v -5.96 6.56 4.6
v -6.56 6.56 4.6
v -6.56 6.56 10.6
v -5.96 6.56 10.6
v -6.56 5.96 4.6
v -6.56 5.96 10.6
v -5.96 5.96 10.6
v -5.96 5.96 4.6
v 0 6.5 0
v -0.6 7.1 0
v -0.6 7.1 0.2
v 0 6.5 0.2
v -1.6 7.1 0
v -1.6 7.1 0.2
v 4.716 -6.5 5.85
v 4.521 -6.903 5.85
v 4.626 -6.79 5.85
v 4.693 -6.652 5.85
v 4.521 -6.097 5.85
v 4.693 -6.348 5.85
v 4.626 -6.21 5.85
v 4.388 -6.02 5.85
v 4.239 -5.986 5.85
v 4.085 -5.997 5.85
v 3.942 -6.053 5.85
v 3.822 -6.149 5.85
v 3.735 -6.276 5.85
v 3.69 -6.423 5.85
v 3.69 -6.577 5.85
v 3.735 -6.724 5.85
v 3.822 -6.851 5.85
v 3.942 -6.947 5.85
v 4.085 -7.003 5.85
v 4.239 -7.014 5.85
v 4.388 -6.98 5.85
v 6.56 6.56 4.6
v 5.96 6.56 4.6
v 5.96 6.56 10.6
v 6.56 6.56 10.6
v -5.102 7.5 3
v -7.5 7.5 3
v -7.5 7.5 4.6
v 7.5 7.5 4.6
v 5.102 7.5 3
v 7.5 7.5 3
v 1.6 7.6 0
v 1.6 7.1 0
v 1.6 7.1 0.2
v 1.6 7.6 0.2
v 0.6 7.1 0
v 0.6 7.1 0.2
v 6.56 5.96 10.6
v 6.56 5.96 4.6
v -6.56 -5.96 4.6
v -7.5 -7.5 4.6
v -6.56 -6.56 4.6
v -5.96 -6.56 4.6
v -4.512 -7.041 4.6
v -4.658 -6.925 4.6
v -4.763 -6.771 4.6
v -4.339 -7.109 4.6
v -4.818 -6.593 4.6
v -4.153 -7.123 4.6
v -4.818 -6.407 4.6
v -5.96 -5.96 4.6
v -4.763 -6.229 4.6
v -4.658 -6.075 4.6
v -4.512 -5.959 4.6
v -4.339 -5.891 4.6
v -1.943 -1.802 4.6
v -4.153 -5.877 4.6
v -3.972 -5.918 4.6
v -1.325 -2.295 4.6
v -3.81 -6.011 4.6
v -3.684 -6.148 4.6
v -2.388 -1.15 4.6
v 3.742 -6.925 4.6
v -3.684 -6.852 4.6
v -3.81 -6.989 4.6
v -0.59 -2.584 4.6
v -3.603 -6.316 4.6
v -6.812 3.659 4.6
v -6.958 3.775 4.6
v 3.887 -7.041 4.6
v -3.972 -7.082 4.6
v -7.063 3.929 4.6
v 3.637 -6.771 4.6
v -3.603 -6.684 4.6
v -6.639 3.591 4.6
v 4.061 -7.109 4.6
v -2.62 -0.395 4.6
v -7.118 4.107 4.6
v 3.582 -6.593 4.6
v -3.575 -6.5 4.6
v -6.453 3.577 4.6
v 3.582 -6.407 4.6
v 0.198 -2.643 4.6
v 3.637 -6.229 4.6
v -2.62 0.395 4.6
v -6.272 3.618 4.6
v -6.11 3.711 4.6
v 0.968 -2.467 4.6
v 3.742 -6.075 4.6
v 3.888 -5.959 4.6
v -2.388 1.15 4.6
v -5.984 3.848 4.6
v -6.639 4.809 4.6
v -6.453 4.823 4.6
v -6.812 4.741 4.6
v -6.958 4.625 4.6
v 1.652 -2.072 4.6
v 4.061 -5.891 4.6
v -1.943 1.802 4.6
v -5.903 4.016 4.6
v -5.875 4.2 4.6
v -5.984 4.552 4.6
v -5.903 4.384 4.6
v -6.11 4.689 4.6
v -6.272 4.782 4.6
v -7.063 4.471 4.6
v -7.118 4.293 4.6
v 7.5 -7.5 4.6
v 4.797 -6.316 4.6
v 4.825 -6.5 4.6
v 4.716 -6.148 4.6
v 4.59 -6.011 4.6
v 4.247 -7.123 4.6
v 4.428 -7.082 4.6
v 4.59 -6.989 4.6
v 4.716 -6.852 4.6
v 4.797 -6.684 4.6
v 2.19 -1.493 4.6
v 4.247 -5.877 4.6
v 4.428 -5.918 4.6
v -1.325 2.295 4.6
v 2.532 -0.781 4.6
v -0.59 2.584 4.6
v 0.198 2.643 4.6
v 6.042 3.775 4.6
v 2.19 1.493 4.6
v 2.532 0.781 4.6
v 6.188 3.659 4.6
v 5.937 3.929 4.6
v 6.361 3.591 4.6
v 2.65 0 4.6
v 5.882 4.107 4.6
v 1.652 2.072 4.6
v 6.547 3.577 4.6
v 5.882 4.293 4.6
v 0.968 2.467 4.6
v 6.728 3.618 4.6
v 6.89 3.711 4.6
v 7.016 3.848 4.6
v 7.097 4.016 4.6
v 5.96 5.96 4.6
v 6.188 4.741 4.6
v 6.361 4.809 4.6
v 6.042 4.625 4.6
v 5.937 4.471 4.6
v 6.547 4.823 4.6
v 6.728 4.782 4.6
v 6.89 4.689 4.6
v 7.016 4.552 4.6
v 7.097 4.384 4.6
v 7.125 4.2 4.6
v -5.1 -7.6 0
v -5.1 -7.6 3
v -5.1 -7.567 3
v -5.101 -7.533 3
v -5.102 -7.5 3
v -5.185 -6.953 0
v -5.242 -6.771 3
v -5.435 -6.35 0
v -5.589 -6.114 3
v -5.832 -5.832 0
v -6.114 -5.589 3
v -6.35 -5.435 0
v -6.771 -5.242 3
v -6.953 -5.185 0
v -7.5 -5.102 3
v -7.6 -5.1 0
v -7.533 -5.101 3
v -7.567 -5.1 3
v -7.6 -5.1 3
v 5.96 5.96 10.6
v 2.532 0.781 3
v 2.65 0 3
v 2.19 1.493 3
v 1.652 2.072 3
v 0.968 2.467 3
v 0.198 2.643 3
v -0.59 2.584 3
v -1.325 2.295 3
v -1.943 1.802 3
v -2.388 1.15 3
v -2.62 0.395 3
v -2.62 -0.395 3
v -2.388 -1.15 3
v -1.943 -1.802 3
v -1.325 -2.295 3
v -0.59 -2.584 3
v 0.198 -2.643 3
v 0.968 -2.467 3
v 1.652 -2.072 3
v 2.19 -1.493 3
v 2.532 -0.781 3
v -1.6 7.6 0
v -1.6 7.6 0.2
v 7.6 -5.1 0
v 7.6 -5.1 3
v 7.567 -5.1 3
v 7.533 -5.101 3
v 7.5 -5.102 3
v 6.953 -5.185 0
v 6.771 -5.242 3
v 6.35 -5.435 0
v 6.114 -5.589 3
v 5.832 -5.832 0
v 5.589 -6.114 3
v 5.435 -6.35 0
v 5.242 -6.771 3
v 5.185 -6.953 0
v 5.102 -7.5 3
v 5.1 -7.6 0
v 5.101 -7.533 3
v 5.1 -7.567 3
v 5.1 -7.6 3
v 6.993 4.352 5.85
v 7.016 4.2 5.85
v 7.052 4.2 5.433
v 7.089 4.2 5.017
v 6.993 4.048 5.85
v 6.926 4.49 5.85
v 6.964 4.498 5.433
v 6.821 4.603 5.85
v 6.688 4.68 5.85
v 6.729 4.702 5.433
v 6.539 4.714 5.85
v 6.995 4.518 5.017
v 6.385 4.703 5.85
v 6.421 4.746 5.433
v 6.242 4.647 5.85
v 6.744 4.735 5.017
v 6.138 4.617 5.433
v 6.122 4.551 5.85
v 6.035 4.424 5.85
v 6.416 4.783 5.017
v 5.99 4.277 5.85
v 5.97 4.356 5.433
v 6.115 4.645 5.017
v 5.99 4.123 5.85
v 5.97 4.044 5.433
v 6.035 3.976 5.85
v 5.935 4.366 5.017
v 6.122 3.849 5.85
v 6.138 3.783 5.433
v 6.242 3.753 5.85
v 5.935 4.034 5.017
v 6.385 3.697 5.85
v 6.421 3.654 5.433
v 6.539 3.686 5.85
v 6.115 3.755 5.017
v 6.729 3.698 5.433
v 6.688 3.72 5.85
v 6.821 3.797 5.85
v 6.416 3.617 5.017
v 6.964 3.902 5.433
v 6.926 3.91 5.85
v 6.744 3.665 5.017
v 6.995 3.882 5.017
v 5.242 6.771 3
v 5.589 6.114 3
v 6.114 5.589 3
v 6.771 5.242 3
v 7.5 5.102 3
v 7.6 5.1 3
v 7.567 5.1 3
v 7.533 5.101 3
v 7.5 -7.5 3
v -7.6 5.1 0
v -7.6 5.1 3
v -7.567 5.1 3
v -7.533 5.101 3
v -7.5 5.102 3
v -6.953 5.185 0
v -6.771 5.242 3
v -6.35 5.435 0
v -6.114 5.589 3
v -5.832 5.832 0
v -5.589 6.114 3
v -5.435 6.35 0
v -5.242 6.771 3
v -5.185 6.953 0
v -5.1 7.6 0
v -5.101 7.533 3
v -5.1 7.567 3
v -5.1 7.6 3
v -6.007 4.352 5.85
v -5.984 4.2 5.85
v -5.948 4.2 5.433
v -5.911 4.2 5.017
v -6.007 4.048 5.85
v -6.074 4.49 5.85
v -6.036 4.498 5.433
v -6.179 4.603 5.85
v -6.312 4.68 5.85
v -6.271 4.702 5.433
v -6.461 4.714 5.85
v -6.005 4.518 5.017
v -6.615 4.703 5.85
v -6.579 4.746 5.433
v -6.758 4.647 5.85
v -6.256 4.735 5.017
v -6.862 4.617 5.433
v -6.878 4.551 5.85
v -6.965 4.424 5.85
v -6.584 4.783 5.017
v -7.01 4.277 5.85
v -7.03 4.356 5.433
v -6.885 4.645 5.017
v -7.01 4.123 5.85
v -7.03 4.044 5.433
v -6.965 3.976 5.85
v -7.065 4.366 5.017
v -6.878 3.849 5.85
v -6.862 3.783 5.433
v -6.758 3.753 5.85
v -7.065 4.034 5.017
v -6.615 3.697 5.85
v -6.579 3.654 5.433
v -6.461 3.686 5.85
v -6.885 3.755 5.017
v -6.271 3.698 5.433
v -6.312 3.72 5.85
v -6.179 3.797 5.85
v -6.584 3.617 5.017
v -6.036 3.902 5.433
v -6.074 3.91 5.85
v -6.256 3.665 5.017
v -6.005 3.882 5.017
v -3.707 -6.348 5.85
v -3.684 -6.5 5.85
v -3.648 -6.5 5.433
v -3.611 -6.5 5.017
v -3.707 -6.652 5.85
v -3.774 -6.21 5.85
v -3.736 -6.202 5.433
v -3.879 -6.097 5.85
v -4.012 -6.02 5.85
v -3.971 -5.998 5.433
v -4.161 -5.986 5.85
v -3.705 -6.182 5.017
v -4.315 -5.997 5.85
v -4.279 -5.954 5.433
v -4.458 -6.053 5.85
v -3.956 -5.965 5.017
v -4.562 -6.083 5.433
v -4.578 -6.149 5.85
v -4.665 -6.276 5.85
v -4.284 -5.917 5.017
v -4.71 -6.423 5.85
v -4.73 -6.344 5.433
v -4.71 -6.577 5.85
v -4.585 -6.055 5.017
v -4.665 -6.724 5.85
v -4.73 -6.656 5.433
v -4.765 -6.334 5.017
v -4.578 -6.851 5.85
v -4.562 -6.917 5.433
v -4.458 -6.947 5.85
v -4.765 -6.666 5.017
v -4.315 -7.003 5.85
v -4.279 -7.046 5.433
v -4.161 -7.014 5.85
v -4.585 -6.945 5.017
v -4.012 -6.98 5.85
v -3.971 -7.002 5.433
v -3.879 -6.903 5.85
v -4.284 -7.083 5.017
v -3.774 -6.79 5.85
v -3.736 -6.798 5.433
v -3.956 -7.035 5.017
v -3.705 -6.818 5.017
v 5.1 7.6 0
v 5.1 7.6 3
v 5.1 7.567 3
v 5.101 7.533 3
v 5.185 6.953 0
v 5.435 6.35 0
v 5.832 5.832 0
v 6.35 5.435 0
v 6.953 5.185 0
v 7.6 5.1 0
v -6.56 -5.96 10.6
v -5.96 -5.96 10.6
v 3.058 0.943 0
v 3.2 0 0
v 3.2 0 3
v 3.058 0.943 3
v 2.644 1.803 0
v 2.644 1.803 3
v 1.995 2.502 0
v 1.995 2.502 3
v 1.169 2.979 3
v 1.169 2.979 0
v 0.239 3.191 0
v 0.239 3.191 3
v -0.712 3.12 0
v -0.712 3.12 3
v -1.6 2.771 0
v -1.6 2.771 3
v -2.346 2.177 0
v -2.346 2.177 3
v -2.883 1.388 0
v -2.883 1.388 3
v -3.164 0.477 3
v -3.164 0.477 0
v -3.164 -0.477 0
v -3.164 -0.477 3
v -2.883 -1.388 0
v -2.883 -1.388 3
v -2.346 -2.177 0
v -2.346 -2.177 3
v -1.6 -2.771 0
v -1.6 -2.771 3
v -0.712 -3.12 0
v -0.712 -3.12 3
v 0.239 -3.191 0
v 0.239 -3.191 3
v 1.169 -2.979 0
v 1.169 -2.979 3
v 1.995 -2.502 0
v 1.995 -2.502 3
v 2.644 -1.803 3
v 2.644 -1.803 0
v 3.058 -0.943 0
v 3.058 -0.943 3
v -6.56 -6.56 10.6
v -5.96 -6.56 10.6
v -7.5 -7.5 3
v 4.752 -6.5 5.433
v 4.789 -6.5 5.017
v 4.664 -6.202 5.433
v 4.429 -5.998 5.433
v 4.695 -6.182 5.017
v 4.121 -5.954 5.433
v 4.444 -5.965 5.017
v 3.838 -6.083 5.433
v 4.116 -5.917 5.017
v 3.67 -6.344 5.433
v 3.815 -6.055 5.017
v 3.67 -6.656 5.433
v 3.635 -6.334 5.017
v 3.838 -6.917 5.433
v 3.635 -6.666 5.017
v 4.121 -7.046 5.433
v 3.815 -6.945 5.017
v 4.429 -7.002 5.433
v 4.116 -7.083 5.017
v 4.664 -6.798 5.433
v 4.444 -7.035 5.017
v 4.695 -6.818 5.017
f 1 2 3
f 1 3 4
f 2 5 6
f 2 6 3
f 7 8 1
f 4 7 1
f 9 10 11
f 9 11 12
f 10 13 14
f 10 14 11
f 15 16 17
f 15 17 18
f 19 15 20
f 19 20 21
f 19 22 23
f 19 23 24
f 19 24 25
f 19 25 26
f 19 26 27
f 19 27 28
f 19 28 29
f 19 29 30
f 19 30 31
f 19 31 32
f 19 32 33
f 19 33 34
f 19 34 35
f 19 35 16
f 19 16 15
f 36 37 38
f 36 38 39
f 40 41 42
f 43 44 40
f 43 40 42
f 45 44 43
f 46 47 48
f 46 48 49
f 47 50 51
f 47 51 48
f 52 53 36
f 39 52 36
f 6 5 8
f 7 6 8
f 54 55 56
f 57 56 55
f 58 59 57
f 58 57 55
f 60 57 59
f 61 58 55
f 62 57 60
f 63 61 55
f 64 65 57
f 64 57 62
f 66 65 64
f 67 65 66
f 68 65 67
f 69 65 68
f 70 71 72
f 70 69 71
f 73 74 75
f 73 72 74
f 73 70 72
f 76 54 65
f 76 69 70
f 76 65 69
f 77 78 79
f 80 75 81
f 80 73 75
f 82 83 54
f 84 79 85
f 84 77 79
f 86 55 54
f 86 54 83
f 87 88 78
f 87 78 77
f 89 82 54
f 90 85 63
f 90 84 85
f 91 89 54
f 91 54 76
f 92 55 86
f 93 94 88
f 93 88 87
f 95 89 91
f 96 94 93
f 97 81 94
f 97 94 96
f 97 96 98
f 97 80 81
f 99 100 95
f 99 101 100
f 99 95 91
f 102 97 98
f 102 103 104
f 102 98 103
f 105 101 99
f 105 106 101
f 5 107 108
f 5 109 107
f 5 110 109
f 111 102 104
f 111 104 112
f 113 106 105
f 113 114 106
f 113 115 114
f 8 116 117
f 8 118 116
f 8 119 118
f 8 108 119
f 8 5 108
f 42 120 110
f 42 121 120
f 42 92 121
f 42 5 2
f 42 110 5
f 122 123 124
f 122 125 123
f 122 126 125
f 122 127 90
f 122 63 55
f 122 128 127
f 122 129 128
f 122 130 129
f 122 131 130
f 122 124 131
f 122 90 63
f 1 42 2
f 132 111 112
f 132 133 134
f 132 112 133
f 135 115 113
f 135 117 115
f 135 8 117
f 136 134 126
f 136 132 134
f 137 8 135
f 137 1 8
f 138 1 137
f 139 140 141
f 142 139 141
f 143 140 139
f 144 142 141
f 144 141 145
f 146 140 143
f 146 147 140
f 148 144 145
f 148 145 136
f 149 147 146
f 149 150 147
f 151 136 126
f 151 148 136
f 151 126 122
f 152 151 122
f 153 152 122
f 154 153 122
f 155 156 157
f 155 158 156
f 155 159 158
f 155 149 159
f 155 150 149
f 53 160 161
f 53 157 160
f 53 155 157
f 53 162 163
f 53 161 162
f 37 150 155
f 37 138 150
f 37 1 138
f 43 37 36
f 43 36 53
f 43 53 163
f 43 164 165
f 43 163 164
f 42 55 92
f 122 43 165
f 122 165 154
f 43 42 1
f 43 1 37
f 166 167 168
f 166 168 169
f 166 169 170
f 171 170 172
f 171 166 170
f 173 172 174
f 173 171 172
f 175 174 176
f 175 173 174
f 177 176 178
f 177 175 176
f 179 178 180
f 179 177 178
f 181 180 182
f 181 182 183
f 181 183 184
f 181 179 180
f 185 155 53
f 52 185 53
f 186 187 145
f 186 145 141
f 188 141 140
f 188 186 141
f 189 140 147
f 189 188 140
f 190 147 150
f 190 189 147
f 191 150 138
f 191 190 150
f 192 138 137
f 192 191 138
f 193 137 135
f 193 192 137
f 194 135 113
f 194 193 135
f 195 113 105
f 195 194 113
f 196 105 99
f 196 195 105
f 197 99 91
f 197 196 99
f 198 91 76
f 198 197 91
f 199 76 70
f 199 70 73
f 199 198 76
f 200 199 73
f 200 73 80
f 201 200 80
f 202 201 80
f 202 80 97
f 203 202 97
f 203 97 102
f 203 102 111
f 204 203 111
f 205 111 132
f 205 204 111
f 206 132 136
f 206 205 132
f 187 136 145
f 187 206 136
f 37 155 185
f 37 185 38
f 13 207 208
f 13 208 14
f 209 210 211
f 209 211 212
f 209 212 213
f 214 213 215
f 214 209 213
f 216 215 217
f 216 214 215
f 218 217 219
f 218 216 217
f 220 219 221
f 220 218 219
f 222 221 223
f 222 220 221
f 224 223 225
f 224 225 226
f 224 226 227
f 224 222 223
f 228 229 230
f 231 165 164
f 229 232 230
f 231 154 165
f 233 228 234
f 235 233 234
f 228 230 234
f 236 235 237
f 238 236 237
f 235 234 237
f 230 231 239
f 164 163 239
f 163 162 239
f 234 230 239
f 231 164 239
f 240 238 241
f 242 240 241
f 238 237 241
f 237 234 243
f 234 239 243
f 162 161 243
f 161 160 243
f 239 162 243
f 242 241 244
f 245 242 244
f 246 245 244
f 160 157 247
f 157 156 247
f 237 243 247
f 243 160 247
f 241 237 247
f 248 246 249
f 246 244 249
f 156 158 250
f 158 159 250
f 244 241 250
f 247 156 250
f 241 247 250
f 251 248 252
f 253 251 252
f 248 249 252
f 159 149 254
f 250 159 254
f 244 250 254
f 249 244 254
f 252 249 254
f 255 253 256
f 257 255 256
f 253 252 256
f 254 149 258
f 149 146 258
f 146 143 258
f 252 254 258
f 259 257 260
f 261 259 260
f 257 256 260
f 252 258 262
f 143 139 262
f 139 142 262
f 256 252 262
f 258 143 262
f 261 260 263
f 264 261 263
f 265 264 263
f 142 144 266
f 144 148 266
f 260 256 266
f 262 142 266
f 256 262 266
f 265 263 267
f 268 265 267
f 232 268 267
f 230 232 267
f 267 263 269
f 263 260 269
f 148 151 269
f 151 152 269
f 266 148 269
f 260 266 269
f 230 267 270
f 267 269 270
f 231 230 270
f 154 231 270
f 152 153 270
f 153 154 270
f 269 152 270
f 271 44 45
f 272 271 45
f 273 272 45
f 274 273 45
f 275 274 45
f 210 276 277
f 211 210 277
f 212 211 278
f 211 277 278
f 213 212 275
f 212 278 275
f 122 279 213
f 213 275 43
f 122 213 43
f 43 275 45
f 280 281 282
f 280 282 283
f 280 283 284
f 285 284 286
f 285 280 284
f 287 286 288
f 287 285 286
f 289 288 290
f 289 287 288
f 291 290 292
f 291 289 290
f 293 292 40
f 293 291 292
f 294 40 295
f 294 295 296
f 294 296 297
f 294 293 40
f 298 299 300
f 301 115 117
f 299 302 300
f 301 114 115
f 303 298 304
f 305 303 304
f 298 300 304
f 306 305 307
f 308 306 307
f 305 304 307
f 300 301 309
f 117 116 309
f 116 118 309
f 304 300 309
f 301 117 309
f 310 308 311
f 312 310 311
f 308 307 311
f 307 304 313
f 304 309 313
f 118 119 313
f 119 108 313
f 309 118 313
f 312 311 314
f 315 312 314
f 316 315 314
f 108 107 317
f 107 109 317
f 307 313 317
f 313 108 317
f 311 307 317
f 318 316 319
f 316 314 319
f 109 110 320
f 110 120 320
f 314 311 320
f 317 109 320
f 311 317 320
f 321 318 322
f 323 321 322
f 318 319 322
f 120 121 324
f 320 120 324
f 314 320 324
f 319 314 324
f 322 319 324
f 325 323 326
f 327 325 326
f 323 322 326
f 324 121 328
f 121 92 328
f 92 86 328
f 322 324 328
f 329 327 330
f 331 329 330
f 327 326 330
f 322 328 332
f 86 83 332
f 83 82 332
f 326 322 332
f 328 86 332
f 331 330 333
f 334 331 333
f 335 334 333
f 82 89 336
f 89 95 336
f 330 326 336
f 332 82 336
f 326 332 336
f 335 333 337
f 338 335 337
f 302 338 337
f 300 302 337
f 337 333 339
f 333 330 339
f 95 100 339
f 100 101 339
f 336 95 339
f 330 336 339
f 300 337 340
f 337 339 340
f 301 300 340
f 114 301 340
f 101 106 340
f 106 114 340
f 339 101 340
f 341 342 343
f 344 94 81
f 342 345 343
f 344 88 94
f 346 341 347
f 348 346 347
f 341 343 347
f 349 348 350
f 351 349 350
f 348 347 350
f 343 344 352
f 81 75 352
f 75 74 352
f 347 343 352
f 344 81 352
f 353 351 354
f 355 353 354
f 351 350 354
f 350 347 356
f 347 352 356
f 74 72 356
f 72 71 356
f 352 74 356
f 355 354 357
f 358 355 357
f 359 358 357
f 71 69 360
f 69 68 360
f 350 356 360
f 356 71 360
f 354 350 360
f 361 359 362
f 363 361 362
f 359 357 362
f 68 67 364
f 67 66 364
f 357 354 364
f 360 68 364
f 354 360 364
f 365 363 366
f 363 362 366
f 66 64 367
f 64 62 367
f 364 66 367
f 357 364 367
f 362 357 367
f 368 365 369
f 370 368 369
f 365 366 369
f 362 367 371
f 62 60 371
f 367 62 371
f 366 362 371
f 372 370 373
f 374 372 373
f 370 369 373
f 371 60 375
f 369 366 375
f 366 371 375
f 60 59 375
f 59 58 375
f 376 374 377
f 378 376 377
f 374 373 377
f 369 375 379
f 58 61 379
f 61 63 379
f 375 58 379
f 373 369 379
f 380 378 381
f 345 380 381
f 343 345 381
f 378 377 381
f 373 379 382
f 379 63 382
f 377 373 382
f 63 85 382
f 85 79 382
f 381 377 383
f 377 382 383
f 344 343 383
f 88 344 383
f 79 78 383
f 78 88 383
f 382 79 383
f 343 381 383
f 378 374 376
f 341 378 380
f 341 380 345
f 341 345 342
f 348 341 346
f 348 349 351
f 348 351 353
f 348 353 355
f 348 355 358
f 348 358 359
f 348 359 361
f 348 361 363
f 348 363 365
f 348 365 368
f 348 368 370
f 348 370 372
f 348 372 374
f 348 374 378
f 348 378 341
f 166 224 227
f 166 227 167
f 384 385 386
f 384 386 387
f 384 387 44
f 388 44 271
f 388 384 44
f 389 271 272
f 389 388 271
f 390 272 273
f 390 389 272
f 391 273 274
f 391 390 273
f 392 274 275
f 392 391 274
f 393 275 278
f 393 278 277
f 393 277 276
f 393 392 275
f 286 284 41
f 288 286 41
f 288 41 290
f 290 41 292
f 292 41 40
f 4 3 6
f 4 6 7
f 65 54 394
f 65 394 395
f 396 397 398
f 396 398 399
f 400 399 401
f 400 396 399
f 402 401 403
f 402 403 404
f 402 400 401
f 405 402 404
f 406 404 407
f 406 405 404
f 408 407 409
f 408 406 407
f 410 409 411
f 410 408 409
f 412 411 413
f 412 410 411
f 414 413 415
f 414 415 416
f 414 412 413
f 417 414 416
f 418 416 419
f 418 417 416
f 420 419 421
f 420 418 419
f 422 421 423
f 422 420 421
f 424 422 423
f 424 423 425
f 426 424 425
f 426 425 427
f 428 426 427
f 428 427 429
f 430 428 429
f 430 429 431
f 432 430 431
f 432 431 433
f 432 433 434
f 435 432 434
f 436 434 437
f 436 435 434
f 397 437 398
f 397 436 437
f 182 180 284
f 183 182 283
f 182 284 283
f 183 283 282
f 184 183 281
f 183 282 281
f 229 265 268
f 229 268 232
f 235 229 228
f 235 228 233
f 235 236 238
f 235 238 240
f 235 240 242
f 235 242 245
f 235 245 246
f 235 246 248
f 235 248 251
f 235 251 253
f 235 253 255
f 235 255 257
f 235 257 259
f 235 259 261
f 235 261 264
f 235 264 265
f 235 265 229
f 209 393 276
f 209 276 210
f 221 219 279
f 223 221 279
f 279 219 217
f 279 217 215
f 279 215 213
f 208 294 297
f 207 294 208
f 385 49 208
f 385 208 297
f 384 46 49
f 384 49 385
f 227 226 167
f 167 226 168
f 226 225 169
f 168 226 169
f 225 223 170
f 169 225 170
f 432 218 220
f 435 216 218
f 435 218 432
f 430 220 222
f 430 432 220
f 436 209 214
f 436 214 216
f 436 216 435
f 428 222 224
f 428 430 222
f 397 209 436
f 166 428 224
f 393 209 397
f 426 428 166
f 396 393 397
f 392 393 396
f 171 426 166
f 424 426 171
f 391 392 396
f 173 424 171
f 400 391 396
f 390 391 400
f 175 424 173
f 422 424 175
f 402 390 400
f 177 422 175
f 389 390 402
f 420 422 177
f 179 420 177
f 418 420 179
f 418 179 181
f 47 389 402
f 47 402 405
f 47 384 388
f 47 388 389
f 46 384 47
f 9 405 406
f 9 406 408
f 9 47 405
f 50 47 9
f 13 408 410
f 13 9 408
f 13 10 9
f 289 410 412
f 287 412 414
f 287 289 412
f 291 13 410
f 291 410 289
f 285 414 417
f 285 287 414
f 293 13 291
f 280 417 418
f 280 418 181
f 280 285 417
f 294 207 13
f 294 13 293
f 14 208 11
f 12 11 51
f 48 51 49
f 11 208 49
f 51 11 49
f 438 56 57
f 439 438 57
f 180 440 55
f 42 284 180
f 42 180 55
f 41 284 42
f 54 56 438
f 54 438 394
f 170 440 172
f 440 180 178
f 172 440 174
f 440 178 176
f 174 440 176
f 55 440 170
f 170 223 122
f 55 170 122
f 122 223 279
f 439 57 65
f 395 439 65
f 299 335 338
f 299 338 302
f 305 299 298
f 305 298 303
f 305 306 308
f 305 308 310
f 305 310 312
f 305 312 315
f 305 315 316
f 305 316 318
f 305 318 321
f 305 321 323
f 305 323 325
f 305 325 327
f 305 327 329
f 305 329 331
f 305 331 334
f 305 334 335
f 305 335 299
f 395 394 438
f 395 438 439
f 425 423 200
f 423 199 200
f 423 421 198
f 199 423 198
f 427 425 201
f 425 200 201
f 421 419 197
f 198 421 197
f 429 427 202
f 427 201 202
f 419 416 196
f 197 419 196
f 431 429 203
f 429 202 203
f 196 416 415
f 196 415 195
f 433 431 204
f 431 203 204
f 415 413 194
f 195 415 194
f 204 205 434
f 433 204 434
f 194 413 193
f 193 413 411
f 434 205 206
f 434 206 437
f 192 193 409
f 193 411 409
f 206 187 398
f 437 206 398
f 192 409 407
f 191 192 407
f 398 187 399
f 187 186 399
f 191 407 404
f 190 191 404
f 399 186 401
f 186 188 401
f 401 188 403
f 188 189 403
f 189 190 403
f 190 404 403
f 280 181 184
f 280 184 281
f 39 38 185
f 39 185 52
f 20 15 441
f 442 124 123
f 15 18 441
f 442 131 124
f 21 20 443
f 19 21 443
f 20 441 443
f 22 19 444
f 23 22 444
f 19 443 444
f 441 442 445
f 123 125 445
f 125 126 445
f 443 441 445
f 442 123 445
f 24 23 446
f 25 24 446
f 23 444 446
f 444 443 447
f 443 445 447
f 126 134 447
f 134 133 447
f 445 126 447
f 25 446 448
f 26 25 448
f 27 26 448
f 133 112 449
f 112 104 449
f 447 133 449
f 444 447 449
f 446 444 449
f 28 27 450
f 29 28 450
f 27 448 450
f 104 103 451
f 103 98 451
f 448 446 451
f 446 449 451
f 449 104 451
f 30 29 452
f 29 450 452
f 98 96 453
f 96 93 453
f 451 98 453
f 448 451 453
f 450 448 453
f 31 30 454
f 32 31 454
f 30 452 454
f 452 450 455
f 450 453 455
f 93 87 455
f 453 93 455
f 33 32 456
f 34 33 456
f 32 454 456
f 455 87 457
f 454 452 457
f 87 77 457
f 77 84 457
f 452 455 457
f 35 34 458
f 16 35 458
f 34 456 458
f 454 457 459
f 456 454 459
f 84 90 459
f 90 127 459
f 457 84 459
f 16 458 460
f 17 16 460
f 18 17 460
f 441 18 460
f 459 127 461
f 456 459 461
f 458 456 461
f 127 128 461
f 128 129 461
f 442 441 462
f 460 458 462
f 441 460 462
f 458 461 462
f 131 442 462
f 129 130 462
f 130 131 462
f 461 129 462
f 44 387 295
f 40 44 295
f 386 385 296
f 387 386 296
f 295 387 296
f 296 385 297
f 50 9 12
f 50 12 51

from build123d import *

# Parameters (mm, degrees)
SKETCH1_R                = 3.2
EXTRUDE1_DEPTH           = 3
SKETCH2_W                = 15
SKETCH2_H                = 15
SKETCH2_R                = 2.65
EXTRUDE2_DEPTH           = 1.6
SKETCH3_W                = 0.6
SKETCH3_H                = 0.6
EXTRUDE3_DEPTH           = 6
SKETCH4_R                = 0.625
EXTRUDE4_DEPTH           = 1.25
EXTRUDE4_DRAFT           = 5
EXTRUDE4_PROFILE_2_DEPTH = 1.25
EXTRUDE4_PROFILE_2_DRAFT = 5
EXTRUDE4_PROFILE_3_DEPTH = 1.25
EXTRUDE4_PROFILE_3_DRAFT = 5
EXTRUDE4_PROFILE_4_DEPTH = 1.25
EXTRUDE4_PROFILE_4_DRAFT = 5
CUT_EXTRUDE1_DEPTH       = 0.2


with BuildPart() as part:
    # Sketch1 → Extrude1 (new body)
    with BuildSketch(Plane.XY):
        with BuildLine():
            Line((-5.1, 7.6), (5.1, 7.6))
            ThreePointArc((5.1, 7.6), (5.832233047, 5.832233047), (7.6, 5.1))
            Line((7.6, 5.1), (7.6, -5.1))
            ThreePointArc((7.6, -5.1), (5.832233047, -5.832233047), (5.1, -7.6))
            Line((5.1, -7.6), (-5.1, -7.6))
            ThreePointArc((-5.1, -7.6), (-5.832233047, -5.832233047), (-7.6, -5.1))
            Line((-7.6, -5.1), (-7.6, 5.1))
            ThreePointArc((-7.6, 5.1), (-5.832233047, 5.832233047), (-5.1, 7.6))
        make_face()
        Circle(SKETCH1_R, mode=Mode.SUBTRACT)
    extrude(amount=EXTRUDE1_DEPTH)

    # Sketch2 → Extrude2 (add)
    with BuildSketch(Plane.XY.offset(3)):
        Rectangle(SKETCH2_W, SKETCH2_H)
        Circle(SKETCH2_R, mode=Mode.SUBTRACT)
    extrude(amount=EXTRUDE2_DEPTH)

    # Sketch3 → Extrude3 (add)
    with BuildSketch(Plane.XY.offset(4.6)):
        with Locations((-6.26, 6.26)):
            Rectangle(SKETCH3_W, SKETCH3_H)
        with Locations((6.26, 6.26)):
            Rectangle(SKETCH3_W, SKETCH3_H)
        with Locations((-6.26, -6.26)):
            Rectangle(SKETCH3_W, SKETCH3_H)
    extrude(amount=EXTRUDE3_DEPTH)


with BuildPart() as extrude4_tool:
    # Sketch4 → Extrude4 (with draft: the straight prism first)
    with BuildSketch(Plane.XY.offset(4.6)):
        with Locations((-4.2, -6.5)):
            Circle(SKETCH4_R)
    extrude(amount=EXTRUDE4_DEPTH)
    # Extrude4: the draft: its side faces are tilted about the plane it starts from
    extrude4_sides = [extrude4_tool.faces().sort_by_distance(p)[0] for p in [
        (-4.825, -6.5, 5.225),
    ]]
    draft(extrude4_sides, Plane.XY.offset(4.6), EXTRUDE4_DRAFT)


with BuildPart() as part_1:
    add(part.part)

    # Extrude4: add extrude4_tool
    add(extrude4_tool.part)


with BuildPart() as extrude4_profile_2_tool:
    # Sketch4 → Extrude4 profile 2 (with draft: the straight prism first)
    with BuildSketch(Plane.XY.offset(4.6)):
        with Locations((4.2, -6.5)):
            Circle(SKETCH4_R)
    extrude(amount=EXTRUDE4_PROFILE_2_DEPTH)
    # Extrude4 profile 2: the draft: its side faces are tilted about the plane it starts from
    extrude4_profile_2_sides = [extrude4_profile_2_tool.faces().sort_by_distance(p)[0] for p in [
        (3.575, -6.5, 5.225),
    ]]
    draft(extrude4_profile_2_sides, Plane.XY.offset(4.6), EXTRUDE4_PROFILE_2_DRAFT)


with BuildPart() as part_2:
    add(part_1.part)

    # Extrude4 profile 2: add extrude4_profile_2_tool
    add(extrude4_profile_2_tool.part)


with BuildPart() as extrude4_profile_3_tool:
    # Sketch4 → Extrude4 profile 3 (with draft: the straight prism first)
    with BuildSketch(Plane.XY.offset(4.6)):
        with Locations((-6.5, 4.2)):
            Circle(SKETCH4_R)
    extrude(amount=EXTRUDE4_PROFILE_3_DEPTH)
    # Extrude4 profile 3: the draft: its side faces are tilted about the plane it starts from
    extrude4_profile_3_sides = [extrude4_profile_3_tool.faces().sort_by_distance(p)[0] for p in [
        (-7.125, 4.2, 5.225),
    ]]
    draft(extrude4_profile_3_sides, Plane.XY.offset(4.6), EXTRUDE4_PROFILE_3_DRAFT)


with BuildPart() as part_3:
    add(part_2.part)

    # Extrude4 profile 3: add extrude4_profile_3_tool
    add(extrude4_profile_3_tool.part)


with BuildPart() as extrude4_profile_4_tool:
    # Sketch4 → Extrude4 profile 4 (with draft: the straight prism first)
    with BuildSketch(Plane.XY.offset(4.6)):
        with Locations((6.5, 4.2)):
            Circle(SKETCH4_R)
    extrude(amount=EXTRUDE4_PROFILE_4_DEPTH)
    # Extrude4 profile 4: the draft: its side faces are tilted about the plane it starts from
    extrude4_profile_4_sides = [extrude4_profile_4_tool.faces().sort_by_distance(p)[0] for p in [
        (5.875, 4.2, 5.225),
    ]]
    draft(extrude4_profile_4_sides, Plane.XY.offset(4.6), EXTRUDE4_PROFILE_4_DRAFT)


with BuildPart() as part_4:
    add(part_3.part)

    # Extrude4 profile 4: add extrude4_profile_4_tool
    add(extrude4_profile_4_tool.part)

    # Sketch5 → Cut-Extrude1 (cut)
    with BuildSketch(Plane(origin=(0, 0, 0), x_dir=(-1, 0, 0), z_dir=(0, 0, -1))):
        Polygon((-1.6, 7.6), (1.6, 7.6), (1.6, 7.1), (0.6, 7.1), (0, 6.5), (-0.6, 7.1), (-1.6, 7.1), align=None)
    extrude(amount=-CUT_EXTRUDE1_DEPTH, mode=Mode.SUBTRACT)


solid = part_4.part
